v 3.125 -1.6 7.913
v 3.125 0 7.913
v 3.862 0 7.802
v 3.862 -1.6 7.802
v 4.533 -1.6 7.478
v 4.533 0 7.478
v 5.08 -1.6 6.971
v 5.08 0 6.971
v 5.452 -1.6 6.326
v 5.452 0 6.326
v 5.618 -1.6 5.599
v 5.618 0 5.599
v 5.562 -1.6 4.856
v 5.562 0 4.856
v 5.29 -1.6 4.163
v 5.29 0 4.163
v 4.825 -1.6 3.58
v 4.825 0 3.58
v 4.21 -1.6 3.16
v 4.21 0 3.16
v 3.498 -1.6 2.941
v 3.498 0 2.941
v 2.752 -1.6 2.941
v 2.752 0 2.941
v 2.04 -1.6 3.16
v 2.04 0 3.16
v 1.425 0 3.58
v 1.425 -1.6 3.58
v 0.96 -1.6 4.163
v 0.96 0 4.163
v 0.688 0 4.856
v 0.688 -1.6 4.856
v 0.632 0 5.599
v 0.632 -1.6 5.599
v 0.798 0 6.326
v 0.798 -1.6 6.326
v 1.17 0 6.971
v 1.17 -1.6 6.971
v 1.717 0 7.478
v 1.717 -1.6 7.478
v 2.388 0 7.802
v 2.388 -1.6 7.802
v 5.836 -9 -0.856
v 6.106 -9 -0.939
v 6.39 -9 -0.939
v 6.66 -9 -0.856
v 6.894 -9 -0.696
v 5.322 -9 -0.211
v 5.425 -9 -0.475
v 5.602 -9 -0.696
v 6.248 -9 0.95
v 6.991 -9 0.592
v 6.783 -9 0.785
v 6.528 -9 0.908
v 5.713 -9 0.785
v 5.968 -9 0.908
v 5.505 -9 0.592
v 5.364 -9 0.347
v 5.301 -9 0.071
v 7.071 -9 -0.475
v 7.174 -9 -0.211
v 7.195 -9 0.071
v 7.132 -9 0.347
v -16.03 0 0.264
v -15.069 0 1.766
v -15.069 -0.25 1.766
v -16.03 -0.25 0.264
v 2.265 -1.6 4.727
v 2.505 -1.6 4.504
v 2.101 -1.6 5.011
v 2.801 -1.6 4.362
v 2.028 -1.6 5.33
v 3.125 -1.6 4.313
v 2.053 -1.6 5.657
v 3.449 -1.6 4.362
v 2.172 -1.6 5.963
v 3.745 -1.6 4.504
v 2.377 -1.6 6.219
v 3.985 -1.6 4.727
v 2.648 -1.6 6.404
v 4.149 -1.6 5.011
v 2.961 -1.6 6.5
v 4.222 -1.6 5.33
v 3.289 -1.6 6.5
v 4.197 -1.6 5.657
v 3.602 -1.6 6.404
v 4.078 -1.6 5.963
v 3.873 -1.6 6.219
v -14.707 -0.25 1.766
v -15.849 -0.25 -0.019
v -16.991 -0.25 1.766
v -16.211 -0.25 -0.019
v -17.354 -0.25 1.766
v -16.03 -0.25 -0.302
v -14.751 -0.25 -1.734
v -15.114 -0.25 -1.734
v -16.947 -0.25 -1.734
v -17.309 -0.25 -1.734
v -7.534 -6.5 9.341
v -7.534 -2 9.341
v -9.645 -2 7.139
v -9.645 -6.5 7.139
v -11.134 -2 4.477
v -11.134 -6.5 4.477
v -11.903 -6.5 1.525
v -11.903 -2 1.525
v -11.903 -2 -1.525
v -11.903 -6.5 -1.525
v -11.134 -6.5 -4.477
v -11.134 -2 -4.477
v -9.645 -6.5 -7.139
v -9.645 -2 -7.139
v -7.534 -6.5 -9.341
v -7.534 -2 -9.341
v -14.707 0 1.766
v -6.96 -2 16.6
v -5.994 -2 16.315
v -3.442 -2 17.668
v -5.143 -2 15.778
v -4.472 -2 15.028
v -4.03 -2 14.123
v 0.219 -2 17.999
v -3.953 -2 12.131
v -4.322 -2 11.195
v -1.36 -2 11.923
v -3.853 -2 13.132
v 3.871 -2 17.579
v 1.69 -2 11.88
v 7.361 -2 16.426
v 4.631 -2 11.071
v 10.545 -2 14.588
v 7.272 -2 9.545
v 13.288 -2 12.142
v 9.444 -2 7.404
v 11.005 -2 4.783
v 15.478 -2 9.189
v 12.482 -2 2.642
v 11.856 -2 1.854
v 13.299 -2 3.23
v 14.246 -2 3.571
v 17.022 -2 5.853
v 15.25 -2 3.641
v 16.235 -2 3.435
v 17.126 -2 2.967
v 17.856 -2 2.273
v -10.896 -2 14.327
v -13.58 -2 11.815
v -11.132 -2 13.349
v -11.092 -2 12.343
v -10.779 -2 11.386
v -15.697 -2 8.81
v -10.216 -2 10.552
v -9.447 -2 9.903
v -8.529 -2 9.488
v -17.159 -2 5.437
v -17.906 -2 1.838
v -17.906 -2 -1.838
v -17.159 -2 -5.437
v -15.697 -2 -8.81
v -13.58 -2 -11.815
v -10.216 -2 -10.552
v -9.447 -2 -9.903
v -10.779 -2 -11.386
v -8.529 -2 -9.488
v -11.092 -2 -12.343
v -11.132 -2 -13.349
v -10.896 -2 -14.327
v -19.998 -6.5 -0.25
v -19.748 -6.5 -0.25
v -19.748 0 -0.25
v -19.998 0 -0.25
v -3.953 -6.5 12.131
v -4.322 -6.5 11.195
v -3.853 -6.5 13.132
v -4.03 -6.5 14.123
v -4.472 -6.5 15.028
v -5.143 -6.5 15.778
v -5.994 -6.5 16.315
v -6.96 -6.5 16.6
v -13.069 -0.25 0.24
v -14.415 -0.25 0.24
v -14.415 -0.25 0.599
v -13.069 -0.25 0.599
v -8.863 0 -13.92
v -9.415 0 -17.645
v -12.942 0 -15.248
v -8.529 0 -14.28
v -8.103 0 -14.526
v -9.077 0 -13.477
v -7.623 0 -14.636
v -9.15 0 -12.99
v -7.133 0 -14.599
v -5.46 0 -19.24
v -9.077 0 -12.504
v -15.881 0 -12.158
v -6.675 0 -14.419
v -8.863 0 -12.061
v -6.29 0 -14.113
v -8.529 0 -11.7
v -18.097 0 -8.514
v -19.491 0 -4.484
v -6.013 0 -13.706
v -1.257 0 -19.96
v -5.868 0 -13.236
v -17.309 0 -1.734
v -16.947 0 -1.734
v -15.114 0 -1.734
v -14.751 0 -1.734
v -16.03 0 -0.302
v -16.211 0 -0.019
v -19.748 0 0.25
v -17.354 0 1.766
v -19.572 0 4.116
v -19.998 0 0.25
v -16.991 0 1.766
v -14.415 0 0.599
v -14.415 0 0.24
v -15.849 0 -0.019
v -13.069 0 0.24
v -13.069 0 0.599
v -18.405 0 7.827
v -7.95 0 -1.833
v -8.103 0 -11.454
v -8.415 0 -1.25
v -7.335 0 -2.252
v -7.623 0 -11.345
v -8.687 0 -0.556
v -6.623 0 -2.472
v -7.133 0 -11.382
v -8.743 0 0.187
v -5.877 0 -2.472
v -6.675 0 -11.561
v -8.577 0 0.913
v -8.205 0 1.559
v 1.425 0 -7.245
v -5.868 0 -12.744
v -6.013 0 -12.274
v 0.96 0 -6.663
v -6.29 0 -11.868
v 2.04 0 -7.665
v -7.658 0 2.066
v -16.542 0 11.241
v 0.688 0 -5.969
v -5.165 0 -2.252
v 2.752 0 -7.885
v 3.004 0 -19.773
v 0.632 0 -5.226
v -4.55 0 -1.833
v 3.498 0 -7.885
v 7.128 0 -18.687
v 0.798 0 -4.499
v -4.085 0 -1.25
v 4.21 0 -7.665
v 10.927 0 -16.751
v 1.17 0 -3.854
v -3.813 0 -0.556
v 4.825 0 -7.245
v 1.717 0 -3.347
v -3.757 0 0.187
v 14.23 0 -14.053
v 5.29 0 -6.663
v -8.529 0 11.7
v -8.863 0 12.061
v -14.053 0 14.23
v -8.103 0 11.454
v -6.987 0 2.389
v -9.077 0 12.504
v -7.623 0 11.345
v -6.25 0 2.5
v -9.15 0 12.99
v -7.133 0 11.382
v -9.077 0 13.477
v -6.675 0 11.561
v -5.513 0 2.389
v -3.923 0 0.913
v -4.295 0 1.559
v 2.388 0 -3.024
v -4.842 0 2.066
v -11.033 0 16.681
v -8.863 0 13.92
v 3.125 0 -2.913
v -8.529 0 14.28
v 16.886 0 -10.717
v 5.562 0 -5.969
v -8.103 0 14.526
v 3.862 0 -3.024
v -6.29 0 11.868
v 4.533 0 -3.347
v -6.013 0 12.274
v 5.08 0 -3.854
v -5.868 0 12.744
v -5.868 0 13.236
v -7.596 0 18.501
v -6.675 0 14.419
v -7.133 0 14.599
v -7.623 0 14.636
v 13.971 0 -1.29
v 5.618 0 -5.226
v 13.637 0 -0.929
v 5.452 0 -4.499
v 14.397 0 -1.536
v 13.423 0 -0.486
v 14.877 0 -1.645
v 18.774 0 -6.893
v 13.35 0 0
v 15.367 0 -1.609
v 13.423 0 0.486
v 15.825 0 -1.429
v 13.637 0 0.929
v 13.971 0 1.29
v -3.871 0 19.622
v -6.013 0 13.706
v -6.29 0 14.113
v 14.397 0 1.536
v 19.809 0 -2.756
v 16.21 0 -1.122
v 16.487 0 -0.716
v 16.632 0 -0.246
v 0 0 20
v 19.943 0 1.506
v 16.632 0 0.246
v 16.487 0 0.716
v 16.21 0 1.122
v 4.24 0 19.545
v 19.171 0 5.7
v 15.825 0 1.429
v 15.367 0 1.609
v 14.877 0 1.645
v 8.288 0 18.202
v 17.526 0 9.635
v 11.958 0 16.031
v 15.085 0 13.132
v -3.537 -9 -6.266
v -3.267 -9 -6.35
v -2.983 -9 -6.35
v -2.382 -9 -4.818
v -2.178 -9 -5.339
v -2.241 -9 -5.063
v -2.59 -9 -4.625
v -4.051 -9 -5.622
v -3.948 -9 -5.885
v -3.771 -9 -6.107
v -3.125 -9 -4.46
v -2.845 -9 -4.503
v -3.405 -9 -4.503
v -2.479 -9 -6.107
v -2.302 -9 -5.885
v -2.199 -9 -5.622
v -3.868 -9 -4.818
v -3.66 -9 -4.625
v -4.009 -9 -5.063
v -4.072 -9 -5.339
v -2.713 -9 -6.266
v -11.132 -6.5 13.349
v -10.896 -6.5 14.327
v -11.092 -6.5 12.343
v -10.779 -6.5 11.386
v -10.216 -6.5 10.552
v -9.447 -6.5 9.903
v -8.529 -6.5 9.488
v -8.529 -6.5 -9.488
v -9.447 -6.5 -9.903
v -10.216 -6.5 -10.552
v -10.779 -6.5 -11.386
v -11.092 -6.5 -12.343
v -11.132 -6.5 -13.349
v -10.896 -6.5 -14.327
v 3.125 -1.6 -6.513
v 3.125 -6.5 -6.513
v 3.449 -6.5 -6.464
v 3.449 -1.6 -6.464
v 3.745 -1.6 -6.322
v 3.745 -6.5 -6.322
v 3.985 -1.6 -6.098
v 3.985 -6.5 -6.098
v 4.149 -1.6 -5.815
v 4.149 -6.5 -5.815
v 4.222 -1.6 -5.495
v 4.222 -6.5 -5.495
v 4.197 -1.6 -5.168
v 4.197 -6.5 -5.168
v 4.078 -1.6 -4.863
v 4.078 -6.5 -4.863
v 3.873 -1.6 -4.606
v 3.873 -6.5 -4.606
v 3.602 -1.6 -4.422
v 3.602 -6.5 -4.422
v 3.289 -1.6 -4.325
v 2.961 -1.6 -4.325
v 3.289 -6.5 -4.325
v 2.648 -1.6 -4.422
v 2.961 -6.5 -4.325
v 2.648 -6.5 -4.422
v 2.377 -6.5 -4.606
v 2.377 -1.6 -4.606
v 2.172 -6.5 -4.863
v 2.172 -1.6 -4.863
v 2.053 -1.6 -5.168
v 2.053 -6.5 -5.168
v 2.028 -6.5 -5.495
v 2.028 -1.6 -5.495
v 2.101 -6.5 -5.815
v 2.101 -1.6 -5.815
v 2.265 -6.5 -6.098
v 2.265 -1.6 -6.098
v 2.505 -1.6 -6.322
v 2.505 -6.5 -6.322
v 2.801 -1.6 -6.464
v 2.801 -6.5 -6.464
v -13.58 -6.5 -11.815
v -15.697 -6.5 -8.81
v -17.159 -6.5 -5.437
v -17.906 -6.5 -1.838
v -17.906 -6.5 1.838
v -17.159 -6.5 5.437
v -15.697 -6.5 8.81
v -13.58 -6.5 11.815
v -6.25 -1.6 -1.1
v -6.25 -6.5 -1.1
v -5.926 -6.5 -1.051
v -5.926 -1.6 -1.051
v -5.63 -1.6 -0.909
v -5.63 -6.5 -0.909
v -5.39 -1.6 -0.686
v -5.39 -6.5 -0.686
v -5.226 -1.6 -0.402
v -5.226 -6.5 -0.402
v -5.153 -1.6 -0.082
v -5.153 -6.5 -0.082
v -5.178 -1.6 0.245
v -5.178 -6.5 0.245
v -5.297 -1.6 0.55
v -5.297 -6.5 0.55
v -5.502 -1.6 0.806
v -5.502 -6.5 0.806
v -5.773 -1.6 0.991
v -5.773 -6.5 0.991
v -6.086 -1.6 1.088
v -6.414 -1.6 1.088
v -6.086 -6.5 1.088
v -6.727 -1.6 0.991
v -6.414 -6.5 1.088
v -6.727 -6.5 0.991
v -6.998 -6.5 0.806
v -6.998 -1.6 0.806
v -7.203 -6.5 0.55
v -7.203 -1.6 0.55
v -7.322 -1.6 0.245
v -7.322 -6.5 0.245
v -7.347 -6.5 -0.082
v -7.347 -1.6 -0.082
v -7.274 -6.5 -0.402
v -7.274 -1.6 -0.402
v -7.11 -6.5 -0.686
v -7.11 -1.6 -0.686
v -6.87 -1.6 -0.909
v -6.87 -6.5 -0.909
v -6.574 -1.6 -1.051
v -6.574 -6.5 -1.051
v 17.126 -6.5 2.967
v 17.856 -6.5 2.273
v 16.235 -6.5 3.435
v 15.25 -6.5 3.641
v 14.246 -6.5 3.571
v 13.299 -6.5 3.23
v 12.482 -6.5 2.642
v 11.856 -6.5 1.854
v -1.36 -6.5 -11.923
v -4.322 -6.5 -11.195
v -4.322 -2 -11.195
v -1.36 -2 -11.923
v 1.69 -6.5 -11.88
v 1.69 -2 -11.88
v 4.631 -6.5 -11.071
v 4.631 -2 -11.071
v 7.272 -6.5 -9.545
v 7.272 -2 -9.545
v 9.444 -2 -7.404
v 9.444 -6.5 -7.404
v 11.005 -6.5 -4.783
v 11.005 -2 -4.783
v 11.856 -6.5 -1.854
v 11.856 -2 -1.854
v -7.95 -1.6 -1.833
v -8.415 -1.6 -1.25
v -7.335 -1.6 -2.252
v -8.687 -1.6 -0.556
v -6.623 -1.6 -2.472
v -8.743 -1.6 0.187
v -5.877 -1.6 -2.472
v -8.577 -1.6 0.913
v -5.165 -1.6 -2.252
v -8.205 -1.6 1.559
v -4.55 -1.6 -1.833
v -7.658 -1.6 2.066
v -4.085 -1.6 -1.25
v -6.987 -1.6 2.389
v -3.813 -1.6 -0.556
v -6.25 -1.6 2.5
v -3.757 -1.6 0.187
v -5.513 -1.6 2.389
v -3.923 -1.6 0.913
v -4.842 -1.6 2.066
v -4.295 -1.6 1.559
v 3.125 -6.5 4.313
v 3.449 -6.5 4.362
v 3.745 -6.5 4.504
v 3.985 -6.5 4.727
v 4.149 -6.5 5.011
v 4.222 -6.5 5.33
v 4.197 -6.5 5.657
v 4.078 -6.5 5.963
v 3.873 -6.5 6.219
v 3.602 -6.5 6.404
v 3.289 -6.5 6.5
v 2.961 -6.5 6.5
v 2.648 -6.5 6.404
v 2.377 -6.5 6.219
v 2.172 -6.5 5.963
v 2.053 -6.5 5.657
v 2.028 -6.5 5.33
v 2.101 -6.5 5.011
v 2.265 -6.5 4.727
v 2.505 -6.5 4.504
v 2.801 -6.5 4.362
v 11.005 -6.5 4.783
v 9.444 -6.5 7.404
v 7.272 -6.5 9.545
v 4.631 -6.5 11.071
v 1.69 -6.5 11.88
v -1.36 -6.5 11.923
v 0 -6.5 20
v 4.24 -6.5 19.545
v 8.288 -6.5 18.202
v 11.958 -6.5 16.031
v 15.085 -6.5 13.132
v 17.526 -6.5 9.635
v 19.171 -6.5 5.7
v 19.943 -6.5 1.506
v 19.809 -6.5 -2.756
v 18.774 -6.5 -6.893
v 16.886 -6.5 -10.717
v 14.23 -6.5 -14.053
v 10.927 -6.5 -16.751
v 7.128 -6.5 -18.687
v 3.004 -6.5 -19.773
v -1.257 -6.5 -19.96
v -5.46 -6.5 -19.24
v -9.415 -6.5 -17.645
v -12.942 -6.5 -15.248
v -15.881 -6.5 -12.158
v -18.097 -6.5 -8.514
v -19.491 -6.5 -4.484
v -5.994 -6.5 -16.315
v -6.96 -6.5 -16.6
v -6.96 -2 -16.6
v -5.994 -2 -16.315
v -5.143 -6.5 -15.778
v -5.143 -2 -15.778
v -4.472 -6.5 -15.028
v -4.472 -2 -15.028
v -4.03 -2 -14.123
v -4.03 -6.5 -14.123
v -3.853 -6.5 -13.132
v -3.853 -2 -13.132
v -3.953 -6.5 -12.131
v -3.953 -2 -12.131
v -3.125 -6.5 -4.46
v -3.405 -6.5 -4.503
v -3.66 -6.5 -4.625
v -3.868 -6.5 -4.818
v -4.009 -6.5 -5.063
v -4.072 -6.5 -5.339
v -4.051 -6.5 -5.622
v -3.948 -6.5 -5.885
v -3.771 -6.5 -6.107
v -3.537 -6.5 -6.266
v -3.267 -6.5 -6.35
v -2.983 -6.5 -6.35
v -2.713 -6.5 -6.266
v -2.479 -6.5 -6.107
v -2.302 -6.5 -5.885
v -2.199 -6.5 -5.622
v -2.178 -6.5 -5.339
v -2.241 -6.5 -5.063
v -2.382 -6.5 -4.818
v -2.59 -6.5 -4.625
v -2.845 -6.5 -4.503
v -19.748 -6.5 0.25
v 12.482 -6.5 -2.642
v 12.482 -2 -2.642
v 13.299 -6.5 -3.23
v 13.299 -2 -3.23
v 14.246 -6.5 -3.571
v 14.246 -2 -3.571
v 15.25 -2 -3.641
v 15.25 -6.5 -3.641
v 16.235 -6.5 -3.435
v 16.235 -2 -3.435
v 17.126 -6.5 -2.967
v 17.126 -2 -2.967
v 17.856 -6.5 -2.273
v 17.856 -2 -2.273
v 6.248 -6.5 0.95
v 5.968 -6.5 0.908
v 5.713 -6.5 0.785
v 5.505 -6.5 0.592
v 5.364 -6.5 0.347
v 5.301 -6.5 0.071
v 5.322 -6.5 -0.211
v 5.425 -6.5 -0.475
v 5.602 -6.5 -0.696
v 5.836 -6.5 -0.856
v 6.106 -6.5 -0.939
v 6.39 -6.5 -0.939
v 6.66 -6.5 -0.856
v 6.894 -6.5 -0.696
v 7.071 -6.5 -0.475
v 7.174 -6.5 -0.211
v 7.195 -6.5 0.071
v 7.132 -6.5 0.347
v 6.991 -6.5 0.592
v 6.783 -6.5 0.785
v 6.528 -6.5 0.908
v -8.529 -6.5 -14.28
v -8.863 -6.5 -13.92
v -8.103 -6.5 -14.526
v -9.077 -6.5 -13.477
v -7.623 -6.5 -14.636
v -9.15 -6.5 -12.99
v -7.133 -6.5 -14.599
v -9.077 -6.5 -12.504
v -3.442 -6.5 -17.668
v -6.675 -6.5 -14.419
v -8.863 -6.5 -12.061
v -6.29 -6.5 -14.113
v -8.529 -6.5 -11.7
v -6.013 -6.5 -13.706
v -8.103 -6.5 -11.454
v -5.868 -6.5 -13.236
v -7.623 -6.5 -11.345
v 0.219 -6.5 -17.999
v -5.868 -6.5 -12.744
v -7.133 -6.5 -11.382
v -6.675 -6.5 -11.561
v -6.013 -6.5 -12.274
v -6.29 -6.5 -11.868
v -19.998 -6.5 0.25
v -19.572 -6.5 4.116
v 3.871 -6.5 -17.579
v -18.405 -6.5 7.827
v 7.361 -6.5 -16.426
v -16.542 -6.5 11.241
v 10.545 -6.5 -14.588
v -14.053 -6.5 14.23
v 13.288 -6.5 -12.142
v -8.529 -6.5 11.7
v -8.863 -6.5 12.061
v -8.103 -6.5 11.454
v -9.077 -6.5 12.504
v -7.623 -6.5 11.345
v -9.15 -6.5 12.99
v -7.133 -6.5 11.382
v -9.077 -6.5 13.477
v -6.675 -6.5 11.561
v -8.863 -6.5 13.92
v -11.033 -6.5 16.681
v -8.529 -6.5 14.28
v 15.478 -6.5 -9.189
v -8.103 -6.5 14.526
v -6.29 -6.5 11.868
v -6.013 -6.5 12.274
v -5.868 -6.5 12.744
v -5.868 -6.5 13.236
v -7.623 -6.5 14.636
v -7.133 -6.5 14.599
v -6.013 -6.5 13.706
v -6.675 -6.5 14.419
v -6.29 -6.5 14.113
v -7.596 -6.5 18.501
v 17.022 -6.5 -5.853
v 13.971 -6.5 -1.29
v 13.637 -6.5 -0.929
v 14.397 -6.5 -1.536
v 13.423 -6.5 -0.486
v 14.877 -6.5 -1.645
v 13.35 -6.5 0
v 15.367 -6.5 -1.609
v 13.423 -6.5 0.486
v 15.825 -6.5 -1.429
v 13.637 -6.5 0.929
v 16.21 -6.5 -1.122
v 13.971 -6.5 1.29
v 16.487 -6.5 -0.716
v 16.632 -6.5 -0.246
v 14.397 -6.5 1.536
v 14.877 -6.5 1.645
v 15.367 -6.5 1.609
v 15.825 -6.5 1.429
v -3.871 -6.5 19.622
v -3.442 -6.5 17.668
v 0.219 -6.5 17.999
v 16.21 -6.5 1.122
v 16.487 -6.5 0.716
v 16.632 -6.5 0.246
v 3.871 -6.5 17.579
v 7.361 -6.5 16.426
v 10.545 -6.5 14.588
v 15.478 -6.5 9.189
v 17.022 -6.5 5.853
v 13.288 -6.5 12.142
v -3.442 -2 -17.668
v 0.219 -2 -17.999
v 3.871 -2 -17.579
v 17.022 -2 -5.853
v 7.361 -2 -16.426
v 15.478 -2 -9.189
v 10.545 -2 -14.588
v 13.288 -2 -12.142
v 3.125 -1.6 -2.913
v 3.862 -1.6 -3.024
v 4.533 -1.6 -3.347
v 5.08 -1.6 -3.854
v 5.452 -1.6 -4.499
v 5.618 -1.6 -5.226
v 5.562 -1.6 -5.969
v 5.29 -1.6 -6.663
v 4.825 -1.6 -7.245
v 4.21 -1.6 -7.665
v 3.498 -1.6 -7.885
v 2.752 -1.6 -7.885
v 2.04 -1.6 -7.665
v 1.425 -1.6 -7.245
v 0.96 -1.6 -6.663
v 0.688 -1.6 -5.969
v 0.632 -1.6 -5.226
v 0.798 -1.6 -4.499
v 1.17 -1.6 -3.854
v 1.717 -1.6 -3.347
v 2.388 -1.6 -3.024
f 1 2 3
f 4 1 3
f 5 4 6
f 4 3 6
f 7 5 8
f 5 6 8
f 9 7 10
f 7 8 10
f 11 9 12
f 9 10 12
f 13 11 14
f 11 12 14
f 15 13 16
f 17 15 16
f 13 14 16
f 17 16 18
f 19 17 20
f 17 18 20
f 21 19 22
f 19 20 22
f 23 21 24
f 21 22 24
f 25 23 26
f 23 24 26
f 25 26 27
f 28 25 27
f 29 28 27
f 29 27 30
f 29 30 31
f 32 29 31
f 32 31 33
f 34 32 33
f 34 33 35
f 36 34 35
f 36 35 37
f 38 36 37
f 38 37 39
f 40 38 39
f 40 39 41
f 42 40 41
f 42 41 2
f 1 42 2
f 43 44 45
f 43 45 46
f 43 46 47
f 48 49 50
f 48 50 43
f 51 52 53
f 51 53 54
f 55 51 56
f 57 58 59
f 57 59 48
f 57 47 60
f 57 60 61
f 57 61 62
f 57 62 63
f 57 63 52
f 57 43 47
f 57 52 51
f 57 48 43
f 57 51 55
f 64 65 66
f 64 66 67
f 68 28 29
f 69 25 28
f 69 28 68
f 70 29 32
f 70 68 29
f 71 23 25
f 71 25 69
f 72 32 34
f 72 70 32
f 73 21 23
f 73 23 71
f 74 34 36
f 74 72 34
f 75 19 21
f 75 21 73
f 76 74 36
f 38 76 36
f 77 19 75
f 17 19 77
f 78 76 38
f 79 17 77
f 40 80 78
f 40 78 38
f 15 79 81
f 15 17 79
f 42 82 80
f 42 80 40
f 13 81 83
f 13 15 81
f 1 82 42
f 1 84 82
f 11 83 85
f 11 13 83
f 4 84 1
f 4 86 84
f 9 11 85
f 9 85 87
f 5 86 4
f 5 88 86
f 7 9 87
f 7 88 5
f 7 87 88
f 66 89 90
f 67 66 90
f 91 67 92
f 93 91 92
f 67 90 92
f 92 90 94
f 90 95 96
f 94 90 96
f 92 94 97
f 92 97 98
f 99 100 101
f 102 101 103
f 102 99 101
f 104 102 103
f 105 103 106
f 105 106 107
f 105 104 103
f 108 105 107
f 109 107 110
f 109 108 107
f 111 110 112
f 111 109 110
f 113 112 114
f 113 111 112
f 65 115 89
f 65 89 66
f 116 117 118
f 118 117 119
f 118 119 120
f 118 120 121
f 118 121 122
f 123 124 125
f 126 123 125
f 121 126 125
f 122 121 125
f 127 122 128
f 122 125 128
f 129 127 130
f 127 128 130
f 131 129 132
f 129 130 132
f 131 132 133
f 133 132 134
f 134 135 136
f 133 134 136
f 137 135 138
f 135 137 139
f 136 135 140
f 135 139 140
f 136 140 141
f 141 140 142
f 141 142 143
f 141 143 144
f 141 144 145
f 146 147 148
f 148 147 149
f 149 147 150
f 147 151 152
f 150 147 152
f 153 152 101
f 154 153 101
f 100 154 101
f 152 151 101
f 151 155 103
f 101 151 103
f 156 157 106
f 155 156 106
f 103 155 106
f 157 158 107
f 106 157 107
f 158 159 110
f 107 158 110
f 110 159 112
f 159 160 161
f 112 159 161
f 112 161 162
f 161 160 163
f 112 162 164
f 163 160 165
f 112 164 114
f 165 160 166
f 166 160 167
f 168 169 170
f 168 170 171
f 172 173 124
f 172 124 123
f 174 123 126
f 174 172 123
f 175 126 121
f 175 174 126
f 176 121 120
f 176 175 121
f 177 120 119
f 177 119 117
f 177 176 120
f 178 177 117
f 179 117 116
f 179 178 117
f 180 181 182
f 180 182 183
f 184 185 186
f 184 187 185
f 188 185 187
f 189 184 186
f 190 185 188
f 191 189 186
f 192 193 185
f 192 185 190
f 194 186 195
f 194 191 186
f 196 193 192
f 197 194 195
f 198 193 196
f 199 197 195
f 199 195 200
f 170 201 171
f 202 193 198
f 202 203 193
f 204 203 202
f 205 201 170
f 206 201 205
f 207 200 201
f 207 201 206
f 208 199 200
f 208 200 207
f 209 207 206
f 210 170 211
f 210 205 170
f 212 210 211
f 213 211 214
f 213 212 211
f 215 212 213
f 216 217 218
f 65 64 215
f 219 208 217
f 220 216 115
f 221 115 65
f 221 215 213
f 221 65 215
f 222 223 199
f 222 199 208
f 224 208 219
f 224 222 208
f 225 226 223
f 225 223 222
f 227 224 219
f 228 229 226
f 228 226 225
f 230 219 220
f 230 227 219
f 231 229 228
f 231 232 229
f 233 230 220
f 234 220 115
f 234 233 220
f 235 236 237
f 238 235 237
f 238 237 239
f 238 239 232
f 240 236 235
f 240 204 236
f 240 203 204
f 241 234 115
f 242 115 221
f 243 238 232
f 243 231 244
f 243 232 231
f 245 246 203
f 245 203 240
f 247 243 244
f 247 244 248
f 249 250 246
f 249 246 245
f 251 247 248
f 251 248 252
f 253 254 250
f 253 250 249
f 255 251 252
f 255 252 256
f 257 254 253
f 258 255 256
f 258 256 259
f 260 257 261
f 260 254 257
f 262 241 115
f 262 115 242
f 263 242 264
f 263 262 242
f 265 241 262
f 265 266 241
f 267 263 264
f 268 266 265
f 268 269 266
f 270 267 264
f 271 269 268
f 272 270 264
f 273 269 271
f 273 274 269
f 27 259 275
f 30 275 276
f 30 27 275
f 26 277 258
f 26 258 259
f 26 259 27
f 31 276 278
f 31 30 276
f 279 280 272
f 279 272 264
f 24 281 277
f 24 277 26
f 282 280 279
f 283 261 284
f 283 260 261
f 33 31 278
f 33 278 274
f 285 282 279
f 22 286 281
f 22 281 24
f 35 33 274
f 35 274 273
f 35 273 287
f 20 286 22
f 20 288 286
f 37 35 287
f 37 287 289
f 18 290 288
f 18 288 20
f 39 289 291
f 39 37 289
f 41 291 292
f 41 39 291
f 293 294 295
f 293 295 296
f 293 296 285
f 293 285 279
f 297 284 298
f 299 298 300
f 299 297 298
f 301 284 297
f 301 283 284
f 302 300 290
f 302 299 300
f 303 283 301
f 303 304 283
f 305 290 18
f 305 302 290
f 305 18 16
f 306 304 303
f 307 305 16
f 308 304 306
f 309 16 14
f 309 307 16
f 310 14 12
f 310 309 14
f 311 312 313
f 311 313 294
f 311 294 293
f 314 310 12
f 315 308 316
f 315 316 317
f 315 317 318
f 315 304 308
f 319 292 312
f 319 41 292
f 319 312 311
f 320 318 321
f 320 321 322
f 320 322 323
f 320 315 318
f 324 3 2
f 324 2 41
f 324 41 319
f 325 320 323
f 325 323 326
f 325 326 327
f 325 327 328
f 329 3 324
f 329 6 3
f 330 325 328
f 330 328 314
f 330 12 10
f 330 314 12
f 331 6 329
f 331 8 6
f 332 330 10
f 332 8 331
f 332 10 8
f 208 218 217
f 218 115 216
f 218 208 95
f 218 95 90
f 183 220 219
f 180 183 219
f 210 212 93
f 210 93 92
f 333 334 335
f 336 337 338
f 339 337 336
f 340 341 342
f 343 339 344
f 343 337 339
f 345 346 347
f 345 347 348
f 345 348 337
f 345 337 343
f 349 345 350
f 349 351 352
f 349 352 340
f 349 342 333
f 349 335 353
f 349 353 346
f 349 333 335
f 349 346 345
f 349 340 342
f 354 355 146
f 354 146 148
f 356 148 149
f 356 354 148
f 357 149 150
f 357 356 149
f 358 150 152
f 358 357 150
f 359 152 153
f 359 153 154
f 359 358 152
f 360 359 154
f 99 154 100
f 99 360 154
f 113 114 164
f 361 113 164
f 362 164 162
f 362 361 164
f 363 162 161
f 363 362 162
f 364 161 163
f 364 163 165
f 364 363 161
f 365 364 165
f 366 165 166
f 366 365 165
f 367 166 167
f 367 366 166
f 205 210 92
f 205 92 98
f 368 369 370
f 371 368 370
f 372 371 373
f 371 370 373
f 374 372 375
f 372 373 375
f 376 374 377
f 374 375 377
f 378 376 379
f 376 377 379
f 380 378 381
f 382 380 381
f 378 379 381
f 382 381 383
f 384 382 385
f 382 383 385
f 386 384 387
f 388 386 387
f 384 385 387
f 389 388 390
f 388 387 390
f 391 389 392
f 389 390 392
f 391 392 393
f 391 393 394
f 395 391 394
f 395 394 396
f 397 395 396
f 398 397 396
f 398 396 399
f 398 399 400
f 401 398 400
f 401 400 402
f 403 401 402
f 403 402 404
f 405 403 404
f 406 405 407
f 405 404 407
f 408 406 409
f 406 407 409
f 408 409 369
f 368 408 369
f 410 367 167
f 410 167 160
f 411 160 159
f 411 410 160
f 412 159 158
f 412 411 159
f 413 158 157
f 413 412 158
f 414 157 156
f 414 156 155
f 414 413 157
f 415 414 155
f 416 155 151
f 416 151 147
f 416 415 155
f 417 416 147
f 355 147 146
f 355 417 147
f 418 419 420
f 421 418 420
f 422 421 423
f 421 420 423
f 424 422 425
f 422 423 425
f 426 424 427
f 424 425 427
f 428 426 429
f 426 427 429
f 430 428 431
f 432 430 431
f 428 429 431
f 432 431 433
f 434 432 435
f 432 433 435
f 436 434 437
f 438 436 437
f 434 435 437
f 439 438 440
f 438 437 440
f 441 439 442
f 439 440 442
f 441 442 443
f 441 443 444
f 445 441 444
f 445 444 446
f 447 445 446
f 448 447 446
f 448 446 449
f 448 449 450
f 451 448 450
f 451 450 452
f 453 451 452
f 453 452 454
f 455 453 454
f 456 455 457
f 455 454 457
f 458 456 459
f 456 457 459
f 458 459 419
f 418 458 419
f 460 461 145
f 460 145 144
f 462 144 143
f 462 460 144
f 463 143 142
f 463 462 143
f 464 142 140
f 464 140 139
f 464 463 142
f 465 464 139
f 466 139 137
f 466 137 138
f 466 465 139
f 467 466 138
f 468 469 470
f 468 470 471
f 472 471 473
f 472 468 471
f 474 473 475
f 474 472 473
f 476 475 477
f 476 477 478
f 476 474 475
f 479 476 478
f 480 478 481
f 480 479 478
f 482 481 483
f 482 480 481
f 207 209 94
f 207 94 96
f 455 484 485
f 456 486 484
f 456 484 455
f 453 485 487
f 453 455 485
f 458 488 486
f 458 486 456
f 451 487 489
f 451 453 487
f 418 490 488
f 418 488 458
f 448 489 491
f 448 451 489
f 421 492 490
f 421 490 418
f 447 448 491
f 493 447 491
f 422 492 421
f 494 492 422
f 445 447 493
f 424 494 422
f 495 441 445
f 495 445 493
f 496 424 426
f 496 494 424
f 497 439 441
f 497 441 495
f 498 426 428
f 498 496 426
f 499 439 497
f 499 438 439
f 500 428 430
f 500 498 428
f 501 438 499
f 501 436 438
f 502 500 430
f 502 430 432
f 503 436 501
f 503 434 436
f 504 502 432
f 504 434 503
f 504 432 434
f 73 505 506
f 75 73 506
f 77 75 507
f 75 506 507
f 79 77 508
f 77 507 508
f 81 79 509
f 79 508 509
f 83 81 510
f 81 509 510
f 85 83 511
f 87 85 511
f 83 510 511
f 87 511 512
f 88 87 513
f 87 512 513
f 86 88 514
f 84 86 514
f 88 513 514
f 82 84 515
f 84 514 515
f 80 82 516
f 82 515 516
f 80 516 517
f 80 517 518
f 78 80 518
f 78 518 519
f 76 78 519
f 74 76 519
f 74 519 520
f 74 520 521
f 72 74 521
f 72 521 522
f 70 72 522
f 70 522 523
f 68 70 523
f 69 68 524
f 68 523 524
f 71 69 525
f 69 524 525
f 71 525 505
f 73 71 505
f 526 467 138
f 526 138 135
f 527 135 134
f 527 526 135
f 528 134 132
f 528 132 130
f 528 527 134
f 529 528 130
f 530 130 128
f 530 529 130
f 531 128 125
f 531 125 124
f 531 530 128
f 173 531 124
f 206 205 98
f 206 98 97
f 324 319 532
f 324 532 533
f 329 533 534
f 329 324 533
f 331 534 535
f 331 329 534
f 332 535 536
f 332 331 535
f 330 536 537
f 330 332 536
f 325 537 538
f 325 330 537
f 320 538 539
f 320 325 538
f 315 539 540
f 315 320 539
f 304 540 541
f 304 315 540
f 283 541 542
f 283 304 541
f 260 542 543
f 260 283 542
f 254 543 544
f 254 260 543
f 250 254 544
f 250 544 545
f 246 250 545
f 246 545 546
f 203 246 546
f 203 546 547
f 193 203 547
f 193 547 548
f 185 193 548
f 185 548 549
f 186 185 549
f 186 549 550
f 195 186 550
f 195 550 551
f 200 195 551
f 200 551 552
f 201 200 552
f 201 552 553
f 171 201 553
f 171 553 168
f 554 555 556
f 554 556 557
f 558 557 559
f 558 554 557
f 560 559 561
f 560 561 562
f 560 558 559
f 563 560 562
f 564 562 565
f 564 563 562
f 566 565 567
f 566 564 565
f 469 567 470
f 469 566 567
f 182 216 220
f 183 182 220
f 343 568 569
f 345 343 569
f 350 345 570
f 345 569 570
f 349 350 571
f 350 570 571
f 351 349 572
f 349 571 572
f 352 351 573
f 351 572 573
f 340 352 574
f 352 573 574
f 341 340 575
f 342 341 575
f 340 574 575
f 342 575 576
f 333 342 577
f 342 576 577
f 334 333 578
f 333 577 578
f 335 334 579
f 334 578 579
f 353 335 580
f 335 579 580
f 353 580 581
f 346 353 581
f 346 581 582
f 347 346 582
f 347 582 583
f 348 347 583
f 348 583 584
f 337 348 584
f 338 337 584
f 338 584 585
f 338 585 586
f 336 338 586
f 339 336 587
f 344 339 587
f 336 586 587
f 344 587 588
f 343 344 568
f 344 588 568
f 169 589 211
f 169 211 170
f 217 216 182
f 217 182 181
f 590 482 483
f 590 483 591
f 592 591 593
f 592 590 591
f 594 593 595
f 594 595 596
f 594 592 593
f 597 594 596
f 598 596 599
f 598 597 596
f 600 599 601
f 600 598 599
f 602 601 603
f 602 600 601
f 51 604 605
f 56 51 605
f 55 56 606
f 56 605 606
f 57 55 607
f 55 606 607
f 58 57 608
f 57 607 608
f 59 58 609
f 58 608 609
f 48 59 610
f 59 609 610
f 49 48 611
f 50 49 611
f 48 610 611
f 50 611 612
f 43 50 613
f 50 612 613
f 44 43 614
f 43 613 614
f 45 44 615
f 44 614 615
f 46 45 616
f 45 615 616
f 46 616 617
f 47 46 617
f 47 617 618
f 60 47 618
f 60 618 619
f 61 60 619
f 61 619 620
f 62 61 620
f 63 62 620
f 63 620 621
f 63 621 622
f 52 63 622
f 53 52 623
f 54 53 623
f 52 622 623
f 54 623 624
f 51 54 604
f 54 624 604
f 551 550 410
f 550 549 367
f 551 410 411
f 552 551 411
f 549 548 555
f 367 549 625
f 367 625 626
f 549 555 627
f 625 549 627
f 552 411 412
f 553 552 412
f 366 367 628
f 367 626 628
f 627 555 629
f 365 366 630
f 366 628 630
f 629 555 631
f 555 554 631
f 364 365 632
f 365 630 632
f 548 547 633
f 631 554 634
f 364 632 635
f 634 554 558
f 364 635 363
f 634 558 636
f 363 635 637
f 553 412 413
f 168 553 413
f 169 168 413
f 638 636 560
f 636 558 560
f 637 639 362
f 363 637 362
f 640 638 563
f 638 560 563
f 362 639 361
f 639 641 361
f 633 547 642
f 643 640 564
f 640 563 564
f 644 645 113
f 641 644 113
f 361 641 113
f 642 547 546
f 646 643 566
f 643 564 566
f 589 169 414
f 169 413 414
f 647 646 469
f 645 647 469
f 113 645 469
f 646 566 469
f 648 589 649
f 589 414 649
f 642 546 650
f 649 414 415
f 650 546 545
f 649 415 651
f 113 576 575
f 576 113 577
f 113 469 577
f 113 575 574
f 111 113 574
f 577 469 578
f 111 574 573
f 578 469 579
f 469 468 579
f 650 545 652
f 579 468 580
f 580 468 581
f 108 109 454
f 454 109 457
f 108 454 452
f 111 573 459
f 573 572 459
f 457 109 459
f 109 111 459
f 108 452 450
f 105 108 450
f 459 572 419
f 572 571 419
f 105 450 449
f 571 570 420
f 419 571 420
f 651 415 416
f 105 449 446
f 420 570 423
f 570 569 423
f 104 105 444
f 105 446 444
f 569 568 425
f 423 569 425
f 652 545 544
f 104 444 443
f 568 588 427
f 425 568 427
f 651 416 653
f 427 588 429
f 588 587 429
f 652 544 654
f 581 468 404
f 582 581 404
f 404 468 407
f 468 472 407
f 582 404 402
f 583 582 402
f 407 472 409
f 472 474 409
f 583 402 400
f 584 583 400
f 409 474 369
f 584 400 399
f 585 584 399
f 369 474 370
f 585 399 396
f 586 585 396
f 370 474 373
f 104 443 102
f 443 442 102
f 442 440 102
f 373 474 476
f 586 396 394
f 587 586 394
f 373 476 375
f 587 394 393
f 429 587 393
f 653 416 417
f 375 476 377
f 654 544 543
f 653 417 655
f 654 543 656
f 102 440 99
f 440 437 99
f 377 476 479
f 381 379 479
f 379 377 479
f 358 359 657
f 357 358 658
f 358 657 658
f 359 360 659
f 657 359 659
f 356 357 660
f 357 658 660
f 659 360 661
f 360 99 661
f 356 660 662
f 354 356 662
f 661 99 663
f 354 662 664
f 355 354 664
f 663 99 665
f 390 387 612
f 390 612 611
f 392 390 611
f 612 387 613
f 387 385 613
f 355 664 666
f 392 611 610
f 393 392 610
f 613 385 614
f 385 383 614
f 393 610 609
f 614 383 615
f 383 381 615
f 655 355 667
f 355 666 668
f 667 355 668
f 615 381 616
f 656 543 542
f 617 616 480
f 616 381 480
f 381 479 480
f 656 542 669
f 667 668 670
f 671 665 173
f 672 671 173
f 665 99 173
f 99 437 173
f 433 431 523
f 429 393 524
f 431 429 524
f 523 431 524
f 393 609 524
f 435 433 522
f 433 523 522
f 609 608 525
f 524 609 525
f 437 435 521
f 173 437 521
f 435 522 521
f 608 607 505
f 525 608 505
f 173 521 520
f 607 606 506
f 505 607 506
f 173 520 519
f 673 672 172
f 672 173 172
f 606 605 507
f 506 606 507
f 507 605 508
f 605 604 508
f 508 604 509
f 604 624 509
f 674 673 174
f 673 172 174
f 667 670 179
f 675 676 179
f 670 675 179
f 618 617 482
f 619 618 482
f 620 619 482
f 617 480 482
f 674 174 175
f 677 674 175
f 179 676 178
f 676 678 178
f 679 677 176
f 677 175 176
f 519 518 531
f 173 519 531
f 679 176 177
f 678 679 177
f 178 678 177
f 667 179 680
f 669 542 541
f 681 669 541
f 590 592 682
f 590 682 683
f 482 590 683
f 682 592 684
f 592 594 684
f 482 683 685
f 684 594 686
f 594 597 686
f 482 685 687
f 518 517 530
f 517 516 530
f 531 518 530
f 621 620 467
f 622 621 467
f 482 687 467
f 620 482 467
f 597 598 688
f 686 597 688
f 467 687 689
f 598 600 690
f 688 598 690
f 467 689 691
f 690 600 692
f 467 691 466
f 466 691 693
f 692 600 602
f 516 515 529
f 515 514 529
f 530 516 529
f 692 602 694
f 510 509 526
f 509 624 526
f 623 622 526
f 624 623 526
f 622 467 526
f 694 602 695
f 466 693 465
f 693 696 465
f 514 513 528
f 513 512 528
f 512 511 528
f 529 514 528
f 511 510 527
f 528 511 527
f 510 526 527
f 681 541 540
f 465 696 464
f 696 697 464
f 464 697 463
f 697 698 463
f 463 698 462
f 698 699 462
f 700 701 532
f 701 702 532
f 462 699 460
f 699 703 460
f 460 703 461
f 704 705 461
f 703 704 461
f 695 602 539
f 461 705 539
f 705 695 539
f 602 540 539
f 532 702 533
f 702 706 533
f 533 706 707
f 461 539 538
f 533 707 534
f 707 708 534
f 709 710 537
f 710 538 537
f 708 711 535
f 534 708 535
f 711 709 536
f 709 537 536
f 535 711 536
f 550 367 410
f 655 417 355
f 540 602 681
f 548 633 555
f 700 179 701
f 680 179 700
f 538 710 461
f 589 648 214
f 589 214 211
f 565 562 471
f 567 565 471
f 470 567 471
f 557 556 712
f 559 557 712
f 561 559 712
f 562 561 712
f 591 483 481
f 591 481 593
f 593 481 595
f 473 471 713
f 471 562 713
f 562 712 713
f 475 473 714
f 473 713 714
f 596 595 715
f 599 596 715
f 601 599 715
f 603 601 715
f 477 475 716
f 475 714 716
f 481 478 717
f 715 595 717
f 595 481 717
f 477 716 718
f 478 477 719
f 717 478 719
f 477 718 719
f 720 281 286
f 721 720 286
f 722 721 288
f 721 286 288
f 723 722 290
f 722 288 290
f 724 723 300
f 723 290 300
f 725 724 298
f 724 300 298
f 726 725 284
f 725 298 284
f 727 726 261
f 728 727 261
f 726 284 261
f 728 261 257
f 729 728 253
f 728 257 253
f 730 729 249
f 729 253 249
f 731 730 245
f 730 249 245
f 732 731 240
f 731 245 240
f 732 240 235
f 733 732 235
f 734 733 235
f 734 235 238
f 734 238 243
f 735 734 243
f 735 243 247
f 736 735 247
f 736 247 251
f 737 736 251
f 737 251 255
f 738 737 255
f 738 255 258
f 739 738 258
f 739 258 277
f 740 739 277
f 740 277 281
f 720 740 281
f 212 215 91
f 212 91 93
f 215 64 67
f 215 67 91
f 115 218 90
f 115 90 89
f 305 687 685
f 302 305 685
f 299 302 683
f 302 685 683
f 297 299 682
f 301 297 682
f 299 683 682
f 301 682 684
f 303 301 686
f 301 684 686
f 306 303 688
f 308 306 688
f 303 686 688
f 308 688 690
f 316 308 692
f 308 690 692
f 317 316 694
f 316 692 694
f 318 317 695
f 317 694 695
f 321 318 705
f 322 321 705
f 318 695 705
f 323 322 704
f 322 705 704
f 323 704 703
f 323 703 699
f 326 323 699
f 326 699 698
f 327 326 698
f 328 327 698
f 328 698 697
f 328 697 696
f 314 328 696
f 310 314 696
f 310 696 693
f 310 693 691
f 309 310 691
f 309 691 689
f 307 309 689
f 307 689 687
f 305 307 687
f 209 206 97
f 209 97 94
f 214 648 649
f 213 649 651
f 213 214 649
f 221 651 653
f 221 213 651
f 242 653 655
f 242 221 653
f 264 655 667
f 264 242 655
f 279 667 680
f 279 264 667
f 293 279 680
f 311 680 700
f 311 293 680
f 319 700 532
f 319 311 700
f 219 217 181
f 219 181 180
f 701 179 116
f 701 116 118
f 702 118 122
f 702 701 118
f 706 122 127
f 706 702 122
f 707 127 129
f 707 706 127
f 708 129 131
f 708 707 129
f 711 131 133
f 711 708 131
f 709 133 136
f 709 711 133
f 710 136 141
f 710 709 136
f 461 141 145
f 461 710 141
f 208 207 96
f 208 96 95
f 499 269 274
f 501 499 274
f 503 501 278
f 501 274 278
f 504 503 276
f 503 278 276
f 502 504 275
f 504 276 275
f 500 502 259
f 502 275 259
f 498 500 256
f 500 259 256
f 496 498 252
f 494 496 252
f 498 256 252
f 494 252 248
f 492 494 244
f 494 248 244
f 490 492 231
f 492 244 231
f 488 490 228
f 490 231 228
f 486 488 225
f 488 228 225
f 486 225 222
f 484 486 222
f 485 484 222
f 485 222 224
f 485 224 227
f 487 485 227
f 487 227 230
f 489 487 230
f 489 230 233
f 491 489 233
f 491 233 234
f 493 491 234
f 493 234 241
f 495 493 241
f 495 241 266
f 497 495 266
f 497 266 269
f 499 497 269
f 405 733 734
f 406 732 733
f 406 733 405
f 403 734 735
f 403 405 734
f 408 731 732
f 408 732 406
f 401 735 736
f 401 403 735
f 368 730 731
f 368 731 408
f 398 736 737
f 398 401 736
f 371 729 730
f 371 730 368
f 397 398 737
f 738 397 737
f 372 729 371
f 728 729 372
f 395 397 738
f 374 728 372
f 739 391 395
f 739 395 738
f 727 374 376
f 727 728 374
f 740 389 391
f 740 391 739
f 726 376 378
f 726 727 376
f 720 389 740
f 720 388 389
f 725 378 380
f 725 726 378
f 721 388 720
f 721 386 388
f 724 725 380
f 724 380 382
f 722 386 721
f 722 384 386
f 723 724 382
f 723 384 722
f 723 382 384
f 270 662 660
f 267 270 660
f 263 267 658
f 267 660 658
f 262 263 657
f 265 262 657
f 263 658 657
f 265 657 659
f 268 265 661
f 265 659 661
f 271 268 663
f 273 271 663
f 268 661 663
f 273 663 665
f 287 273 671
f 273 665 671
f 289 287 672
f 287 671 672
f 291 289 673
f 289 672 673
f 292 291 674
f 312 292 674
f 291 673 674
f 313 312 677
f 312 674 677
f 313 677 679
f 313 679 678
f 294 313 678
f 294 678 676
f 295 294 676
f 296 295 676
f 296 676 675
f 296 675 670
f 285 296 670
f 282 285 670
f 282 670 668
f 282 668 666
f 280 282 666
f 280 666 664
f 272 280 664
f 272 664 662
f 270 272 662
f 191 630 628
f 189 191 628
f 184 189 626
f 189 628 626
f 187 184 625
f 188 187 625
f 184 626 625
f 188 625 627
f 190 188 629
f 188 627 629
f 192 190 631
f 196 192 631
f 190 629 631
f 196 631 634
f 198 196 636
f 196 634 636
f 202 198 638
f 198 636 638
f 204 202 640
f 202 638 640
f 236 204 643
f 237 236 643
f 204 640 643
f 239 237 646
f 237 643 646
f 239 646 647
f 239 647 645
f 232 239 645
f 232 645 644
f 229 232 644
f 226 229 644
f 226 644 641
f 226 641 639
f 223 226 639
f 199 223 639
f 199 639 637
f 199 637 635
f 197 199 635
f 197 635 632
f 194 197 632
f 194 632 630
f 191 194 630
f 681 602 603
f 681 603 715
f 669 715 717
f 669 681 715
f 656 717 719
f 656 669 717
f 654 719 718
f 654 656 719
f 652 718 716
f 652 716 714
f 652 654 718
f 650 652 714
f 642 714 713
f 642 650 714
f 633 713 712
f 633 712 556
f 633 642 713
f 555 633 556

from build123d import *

# Parameters (mm, degrees)
SKETCH1_R                                        = 20
BOSS_EXTRUDE1_DEPTH                              = 6.5
CBORE_FOR_M2_PAN_HEAD_MACHINE_SCREW1_D           = 2.2
CBORE_FOR_M2_PAN_HEAD_MACHINE_SCREW1_CBORE_D     = 5
CBORE_FOR_M2_PAN_HEAD_MACHINE_SCREW1_CBORE_DEPTH = 1.6
TAP_DRILL_FOR_M4X0_7_TAP1_D                      = 3.3
SHELL1_START                                     = -6.5
SHELL1_OUTLINE_R                                 = 4.5
SHELL1_DEPTH                                     = 4.5
SHELL1_2_OUTLINE_R                               = 4.5
SHELL1_2_OUTLINE_R_2                             = 3.1
SHELL1_2_DEPTH                                   = 2.9
BOSS_EXTRUDE2_START                              = 4.5
SKETCH5_R                                        = 12
SKETCH5_R_2                                      = 1.1
BOSS_EXTRUDE2_DEPTH                              = 4.5
SKETCH6_W                                        = 1.346153846
SKETCH6_H                                        = 0.358974359
CUT_EXTRUDE1_DEPTH                               = 0.25
SKETCH7_R                                        = 0.95
BOSS_EXTRUDE3_DEPTH                              = 2.5
CUT_EXTRUDE2_DEPTH                               = 30.021543722


# Read off the part's stored shape, not the designer's step: Shell1
with BuildPart() as part:
    # Sketch1 → Boss-Extrude1 (new body)
    with BuildSketch(Plane(origin=(0, 0, 0), x_dir=(1, 0, 0), z_dir=(0, 1, 0))):
        with Locations(Location((0, 0, 0), (0, 0, 270))):
            Circle(SKETCH1_R)
    extrude(amount=-BOSS_EXTRUDE1_DEPTH)

    # CBORE for M2 Pan Head Machine Screw1 (through all)
    with Locations(Plane(origin=(3.125, 0, -5.412658774), x_dir=(0, 0, 1), z_dir=(0, 1, 0))):
        with Locations((0, 0), (5.412658774, -9.375), (10.825317548, 0)):
            CounterBoreHole(CBORE_FOR_M2_PAN_HEAD_MACHINE_SCREW1_D / 2, CBORE_FOR_M2_PAN_HEAD_MACHINE_SCREW1_CBORE_D / 2, CBORE_FOR_M2_PAN_HEAD_MACHINE_SCREW1_CBORE_DEPTH)

    # Tap Drill for M4x0.7 Tap1 (through all)
    with Locations(Plane(origin=(0, 0, 0), x_dir=(1, 0, 0), z_dir=(0, 1, 0))):
        with Locations((15, 0), (-7.5, 12.990381057), (-7.5, -12.990381057)):
            Hole(TAP_DRILL_FOR_M4X0_7_TAP1_D / 2)

    # Shell1 outline → Shell1 (cut)
    with BuildSketch(Plane(origin=(0, 0, 0), x_dir=(1, 0, 0), z_dir=(0, 1, 0)).offset(SHELL1_START)):
        with BuildLine():
            ThreePointArc((17.855916667, -2.272936425), (11.35, 0), (17.855916667, 2.272936425))
            ThreePointArc((17.855916667, 2.272936425), (9, 15.588457268), (-6.959537648, 16.600145654))
            ThreePointArc((-6.959537648, 16.600145654), (-5.675, 9.829388333), (-10.896379019, 14.327209229))
            ThreePointArc((-10.896379019, 14.327209229), (-18, 0), (-10.896379019, -14.327209229))
            ThreePointArc((-10.896379019, -14.327209229), (-5.675, -9.829388333), (-6.959537648, -16.600145654))
            ThreePointArc((-6.959537648, -16.600145654), (9, -15.588457268), (17.855916667, -2.272936425))
        make_face()
        with Locations((-6.25, 0)):
            Circle(SHELL1_OUTLINE_R, mode=Mode.SUBTRACT)
        with Locations((3.125, -5.412658774)):
            Circle(SHELL1_OUTLINE_R, mode=Mode.SUBTRACT)
        with Locations((3.125, 5.412658774)):
            Circle(SHELL1_OUTLINE_R, mode=Mode.SUBTRACT)
    extrude(amount=SHELL1_DEPTH, mode=Mode.SUBTRACT)

    # Shell1 2 outline → Shell1 2 (cut)
    # profile 1 of 3: a face of its own
    with BuildSketch(Plane(origin=(0, 0, 0), x_dir=(1, 0, 0), z_dir=(0, 1, 0)).offset(SHELL1_START)):
        with Locations((3.125, -5.412658774)):
            Circle(SHELL1_2_OUTLINE_R)
        with Locations((3.125, -5.412658774)):
            Circle(SHELL1_2_OUTLINE_R_2, mode=Mode.SUBTRACT)
    # profile 2 of 3: a face of its own
    with BuildSketch(Plane(origin=(0, 0, 0), x_dir=(1, 0, 0), z_dir=(0, 1, 0)).offset(SHELL1_START)):
        with Locations((-6.25, 0)):
            Circle(SHELL1_2_OUTLINE_R)
        with Locations((-6.25, 0)):
            Circle(SHELL1_2_OUTLINE_R_2, mode=Mode.SUBTRACT)
    # profile 3 of 3: a face of its own
    with BuildSketch(Plane(origin=(0, 0, 0), x_dir=(1, 0, 0), z_dir=(0, 1, 0)).offset(SHELL1_START)):
        with Locations((3.125, 5.412658774)):
            Circle(SHELL1_2_OUTLINE_R)
        with Locations((3.125, 5.412658774)):
            Circle(SHELL1_2_OUTLINE_R_2, mode=Mode.SUBTRACT)
    extrude(amount=SHELL1_2_DEPTH, mode=Mode.SUBTRACT)

    # Sketch5 → Boss-Extrude2 (add)
    with BuildSketch(Plane.XZ.offset(2).offset(BOSS_EXTRUDE2_START)):
        Circle(SKETCH5_R)
        with Locations(Location((3.125, -5.412658774, 0), (0, 0, 90))):
            Circle(SKETCH5_R_2, mode=Mode.SUBTRACT)
        with Locations(Location((-6.25, 0, 0), (0, 0, 90))):
            Circle(SKETCH5_R_2, mode=Mode.SUBTRACT)
        with Locations(Location((3.125, 5.412658774, 0), (0, 0, 90))):
            Circle(SKETCH5_R_2, mode=Mode.SUBTRACT)
    extrude(amount=-BOSS_EXTRUDE2_DEPTH)

    # Sketch6 → Cut-Extrude1 (cut)
    with BuildSketch(Plane(origin=(0, 0, 0), x_dir=(1, 0, 0), z_dir=(0, 1, 0))):
        Polygon((-17.309082509, 1.733907393), (-16.946602541, 1.733907393), (-16.030236355, 0.302216688), (-15.11387017, 1.733907393), (-14.751390202, 1.733907393), (-15.848645811, 0.018963483), (-14.706518407, -1.766092607), (-15.068998375, -1.766092607), (-16.030236355, -0.264289722), (-16.991474336, -1.766092607), (-17.353954304, -1.766092607), (-16.211125779, 0.018963483), align=None)
        with Locations((-13.741774817, -0.419938761)):
            Rectangle(SKETCH6_W, SKETCH6_H)
    extrude(amount=-CUT_EXTRUDE1_DEPTH, mode=Mode.SUBTRACT)

    # Sketch7 → Boss-Extrude3 (add)
    with BuildSketch(Plane.XZ.offset(6.5)):
        with Locations(Location((6.248, 0, 0), (0, 0, 90))):
            Circle(SKETCH7_R)
        with Locations(Location((-3.125, -5.410349249, 0), (0, 0, 90))):
            Circle(SKETCH7_R)
    extrude(amount=BOSS_EXTRUDE3_DEPTH)

    # Sketch9 → Cut-Extrude2 (cut, through all)
    with BuildSketch(Plane.XZ.offset(6.5)):
        with BuildLine():
            Line((-19.748437439, 0.25), (-19.748437439, -0.25))
            Line((-19.748437439, -0.25), (-19.998437439, -0.25))
            ThreePointArc((-19.998437439, -0.25), (-20, 0), (-19.998437439, 0.25))
            Line((-19.998437439, 0.25), (-19.748437439, 0.25))
        make_face()
    extrude(amount=-CUT_EXTRUDE2_DEPTH, mode=Mode.SUBTRACT)


solid = part.part
